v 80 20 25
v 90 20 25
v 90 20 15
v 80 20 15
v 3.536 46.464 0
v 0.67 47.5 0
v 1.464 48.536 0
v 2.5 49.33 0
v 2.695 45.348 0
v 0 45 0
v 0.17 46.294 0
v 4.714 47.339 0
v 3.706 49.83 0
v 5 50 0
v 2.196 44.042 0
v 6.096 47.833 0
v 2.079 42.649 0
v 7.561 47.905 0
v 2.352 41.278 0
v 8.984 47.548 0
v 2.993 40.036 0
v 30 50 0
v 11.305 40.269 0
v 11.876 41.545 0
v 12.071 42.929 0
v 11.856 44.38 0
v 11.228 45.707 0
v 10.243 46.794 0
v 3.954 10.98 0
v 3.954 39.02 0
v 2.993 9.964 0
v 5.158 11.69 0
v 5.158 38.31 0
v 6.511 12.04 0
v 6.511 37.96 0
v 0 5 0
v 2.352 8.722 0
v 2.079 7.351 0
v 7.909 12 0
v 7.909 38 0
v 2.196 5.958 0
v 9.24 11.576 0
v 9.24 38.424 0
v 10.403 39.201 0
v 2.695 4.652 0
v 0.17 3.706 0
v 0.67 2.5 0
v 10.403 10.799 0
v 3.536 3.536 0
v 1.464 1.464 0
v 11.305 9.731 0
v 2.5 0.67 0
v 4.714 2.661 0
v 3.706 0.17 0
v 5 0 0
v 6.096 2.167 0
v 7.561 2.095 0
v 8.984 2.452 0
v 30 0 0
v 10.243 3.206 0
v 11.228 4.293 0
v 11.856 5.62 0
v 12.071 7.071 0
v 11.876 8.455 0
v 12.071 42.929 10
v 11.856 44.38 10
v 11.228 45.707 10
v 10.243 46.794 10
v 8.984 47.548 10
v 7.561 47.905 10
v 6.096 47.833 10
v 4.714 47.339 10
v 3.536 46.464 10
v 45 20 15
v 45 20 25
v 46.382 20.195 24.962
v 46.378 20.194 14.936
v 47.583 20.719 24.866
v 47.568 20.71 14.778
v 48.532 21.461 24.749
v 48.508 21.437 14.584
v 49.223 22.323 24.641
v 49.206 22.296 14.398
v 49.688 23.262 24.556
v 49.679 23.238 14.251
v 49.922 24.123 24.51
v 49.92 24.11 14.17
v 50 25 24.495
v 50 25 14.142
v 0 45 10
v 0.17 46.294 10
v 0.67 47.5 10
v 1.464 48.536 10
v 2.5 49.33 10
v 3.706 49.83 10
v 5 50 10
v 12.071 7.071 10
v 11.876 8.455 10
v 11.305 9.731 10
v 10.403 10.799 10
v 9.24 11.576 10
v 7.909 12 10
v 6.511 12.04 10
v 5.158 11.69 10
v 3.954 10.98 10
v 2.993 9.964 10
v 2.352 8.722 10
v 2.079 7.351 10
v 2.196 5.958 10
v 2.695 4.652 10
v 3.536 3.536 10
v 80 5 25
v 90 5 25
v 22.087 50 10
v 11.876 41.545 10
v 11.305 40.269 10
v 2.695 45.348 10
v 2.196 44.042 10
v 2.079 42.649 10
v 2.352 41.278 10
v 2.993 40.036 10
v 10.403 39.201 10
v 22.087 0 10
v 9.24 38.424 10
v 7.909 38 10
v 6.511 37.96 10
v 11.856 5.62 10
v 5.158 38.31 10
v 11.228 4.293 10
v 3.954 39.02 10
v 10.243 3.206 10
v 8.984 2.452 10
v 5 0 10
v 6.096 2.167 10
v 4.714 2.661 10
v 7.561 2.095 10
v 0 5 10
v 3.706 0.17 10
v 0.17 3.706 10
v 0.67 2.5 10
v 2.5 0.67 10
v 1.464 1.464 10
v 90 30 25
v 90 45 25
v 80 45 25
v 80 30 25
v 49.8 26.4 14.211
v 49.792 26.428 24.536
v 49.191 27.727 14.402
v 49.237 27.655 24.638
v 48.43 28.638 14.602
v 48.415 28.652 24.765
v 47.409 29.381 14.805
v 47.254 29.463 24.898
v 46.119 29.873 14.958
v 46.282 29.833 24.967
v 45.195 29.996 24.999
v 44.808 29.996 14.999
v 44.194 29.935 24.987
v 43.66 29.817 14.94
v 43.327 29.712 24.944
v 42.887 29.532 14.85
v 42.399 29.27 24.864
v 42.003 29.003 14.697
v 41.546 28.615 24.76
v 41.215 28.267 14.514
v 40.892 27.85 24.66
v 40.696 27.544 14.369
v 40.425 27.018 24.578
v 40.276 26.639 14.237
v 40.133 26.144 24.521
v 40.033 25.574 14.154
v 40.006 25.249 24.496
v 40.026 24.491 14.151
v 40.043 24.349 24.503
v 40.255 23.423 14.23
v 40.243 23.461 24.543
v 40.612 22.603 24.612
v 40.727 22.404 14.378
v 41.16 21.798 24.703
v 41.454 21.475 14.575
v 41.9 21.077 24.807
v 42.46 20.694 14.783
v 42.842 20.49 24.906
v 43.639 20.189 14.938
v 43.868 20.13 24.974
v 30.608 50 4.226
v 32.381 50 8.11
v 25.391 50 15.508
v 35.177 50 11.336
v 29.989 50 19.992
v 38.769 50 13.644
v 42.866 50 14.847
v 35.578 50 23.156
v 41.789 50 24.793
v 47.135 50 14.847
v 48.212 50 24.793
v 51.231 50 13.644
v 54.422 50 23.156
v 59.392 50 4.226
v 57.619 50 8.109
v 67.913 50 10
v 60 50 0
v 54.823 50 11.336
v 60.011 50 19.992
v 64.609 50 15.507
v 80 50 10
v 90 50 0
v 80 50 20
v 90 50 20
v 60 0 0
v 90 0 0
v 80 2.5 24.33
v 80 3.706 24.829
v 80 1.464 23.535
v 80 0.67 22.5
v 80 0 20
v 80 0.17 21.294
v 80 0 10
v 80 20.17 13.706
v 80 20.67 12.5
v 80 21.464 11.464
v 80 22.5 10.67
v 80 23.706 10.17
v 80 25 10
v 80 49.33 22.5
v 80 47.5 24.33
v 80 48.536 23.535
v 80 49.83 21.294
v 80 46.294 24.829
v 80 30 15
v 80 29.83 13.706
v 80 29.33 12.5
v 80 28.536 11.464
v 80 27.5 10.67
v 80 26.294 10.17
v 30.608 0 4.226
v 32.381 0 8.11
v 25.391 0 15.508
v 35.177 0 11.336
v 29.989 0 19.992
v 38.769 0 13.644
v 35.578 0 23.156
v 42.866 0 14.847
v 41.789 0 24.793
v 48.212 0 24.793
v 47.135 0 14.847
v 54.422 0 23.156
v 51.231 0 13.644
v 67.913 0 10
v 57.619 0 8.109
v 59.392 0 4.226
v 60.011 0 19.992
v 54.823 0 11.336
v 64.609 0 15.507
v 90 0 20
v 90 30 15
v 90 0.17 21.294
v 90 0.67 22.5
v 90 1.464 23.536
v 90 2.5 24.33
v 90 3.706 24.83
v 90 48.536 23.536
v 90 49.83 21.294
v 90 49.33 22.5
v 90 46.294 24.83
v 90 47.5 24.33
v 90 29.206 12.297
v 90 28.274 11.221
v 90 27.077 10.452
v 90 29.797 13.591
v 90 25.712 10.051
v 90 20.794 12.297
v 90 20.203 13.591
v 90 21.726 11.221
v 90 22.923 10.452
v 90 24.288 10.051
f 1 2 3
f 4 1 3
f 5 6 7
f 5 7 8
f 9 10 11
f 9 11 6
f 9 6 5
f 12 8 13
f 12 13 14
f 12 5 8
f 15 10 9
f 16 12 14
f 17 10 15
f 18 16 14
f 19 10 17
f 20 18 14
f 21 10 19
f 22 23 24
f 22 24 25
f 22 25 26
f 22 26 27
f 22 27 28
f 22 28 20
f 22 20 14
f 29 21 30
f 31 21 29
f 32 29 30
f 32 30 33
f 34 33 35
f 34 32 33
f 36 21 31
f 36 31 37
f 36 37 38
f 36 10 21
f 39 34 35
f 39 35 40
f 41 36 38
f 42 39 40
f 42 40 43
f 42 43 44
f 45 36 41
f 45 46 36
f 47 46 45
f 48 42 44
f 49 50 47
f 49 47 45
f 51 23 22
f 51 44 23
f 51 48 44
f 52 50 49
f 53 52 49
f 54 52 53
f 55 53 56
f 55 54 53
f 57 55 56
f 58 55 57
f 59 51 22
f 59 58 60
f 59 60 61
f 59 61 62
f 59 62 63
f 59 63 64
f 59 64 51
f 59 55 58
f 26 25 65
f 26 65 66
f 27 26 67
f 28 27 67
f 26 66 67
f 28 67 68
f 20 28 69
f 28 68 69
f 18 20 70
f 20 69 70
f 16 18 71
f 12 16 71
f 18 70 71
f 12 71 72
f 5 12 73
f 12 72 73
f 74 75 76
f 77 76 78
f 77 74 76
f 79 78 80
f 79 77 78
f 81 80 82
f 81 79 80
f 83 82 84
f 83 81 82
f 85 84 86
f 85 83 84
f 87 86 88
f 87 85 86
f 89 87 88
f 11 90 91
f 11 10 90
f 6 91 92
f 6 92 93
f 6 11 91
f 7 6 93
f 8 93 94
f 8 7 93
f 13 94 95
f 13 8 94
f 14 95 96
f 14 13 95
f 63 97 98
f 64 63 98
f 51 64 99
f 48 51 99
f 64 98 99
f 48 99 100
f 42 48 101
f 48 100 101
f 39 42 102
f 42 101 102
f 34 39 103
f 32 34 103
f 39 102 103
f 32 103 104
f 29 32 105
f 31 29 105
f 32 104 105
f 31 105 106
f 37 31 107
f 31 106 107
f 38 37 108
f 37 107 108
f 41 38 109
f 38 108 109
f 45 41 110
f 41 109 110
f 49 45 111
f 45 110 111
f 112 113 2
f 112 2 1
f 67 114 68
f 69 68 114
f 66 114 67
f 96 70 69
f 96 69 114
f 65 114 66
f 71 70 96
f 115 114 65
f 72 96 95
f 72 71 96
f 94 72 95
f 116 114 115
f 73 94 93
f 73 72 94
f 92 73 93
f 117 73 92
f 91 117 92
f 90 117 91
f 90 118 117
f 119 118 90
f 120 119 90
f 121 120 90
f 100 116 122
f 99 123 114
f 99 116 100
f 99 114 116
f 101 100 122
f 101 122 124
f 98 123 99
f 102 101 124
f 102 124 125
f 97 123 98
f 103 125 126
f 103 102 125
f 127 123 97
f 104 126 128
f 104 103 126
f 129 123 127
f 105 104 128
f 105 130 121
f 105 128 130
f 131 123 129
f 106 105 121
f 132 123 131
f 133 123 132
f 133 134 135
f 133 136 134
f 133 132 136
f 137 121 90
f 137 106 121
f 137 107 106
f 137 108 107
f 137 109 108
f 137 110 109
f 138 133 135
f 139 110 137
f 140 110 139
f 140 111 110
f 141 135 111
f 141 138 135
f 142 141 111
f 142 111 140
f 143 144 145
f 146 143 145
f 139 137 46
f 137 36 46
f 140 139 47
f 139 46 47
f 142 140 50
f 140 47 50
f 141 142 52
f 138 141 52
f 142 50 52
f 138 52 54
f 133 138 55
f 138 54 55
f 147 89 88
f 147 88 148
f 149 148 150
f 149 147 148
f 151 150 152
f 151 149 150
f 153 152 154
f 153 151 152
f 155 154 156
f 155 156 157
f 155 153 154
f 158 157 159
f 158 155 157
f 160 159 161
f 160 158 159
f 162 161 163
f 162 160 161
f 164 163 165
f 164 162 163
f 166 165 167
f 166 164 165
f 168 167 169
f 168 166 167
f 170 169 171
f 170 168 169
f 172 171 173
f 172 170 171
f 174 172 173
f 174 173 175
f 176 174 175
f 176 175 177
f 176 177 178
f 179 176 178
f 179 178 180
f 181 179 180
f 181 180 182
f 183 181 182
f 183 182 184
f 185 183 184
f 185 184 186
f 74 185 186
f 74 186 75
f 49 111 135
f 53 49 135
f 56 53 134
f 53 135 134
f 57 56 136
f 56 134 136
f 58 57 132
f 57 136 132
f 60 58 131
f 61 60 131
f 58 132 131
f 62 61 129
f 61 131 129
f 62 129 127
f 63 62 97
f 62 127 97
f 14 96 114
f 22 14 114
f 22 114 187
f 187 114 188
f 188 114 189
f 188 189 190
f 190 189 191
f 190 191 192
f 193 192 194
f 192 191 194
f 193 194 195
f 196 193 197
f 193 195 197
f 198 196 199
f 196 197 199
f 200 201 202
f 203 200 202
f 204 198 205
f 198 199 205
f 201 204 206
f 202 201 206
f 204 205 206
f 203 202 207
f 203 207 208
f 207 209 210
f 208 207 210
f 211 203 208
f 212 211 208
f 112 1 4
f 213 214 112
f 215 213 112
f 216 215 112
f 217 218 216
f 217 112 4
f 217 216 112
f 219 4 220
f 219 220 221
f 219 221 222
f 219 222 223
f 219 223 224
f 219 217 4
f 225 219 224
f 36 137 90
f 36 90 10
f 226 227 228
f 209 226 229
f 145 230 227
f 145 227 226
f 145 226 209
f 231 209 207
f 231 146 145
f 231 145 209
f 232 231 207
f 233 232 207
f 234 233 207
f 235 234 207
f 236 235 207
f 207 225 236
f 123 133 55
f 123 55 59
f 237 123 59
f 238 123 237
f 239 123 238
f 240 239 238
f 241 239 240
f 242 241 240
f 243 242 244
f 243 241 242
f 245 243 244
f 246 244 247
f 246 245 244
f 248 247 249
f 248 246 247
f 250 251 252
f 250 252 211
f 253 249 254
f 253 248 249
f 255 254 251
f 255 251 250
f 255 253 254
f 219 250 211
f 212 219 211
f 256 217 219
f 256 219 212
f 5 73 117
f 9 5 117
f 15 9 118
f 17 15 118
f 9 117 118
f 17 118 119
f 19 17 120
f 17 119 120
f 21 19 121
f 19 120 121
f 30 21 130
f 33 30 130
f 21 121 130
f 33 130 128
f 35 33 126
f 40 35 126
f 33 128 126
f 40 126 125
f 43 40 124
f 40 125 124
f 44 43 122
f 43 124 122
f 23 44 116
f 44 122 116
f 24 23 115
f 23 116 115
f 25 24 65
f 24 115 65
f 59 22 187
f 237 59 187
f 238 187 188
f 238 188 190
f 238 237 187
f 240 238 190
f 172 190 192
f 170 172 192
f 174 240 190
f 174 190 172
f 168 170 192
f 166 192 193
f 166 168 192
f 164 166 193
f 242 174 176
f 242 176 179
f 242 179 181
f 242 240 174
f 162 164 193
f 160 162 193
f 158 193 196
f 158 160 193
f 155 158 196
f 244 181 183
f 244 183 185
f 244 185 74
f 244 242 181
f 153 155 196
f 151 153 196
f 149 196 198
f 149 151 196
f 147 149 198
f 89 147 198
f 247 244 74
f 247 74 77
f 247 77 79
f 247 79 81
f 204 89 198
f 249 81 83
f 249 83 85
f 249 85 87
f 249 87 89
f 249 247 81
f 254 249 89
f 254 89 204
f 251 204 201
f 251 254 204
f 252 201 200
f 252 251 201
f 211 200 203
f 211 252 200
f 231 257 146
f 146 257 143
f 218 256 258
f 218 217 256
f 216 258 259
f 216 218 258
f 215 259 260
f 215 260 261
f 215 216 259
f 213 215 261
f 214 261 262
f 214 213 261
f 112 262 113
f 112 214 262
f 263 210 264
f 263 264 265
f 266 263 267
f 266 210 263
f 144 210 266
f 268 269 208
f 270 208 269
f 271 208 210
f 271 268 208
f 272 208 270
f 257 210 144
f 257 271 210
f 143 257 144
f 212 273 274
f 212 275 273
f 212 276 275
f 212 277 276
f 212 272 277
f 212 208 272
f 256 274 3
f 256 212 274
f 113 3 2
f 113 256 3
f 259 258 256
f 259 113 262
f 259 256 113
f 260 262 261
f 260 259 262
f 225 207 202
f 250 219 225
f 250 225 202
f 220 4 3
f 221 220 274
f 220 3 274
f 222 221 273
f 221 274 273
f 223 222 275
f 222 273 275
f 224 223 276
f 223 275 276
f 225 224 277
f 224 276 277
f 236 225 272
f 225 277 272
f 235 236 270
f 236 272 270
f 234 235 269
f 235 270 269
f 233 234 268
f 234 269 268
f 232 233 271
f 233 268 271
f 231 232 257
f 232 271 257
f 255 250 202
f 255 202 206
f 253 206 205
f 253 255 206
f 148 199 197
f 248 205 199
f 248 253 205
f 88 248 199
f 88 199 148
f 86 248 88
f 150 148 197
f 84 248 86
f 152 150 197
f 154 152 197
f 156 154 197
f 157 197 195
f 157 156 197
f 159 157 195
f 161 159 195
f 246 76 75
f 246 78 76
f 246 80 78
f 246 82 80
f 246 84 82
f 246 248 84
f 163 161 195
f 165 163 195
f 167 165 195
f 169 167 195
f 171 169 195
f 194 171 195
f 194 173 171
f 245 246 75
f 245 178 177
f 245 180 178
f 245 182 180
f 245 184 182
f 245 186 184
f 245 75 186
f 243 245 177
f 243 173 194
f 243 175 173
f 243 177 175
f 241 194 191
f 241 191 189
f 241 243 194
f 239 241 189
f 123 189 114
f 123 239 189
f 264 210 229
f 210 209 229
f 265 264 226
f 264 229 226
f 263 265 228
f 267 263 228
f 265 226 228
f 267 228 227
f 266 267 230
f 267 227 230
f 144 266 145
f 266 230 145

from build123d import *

# Parameters (mm, degrees)
F1_DEPTH = 50
F3_DEPTH = 10
F5_DEPTH = 10
F7_DEPTH = 25.9997663884
F8_R     = 5
F9_R     = 5


with BuildPart() as f1:
    # F0 (on Front) → F1 (new body)
    with BuildSketch(Plane.XZ):
        with BuildLine():
            Line((0, 10), (0, 0))
            Line((0, 0), (30, 0))
            ThreePointArc((30.0000000018, 0), (45.0002337116, 14.9997662866), (59.9999999982, -0.0004674232))
            Line((60, -0.0004674232), (89.9999999964, 0))
            Line((89.9999999964, 0), (89.999610477, 24.999999997))
            Line((89.999610477, 24.999999997), (79.9996104782, 24.9998441892))
            Line((79.9996104782, 24.9998441892), (79.9998441898, 9.999844191))
            Line((79.9998441898, 9.999844191), (67.9129266661, 9.9996558675))
            ThreePointArc((67.9129266661, 9.9996558675), (45.0001877399, 24.9997662877), (22.0872235267, 10))
            Line((22.0872235267, 10), (0, 10))
        make_face()
    extrude(amount=-F1_DEPTH)

    # F2 (on face) → F3 (cut, through all)
    with BuildSketch(Plane(origin=(89.9999999745, 0, 0.0014022697), x_dir=(0, 1, 0), z_dir=(0.9999999999, 0, 1.55808e-05))):
        with BuildLine():
            Line((30, 24.9985977303), (20, 24.9985977303))
            Line((20, 24.9985977303), (20, 14.9985977303))
            ThreePointArc((20, 14.9985977303), (25, 9.9985977303), (30, 14.9985977303))
            Line((30, 14.9985977303), (30, 24.9985977303))
        make_face()
    extrude(amount=-F3_DEPTH, mode=Mode.SUBTRACT)

    # F4 (on face) → F5 (cut, through all)
    with BuildSketch(Plane.XY.offset(10)):
        with BuildLine():
            ThreePointArc((12.0710678119, 42.9289321881), (8.9844849737, 47.5483298507), (3.5355339059, 46.4644660941))
            ThreePointArc((3.5355339059, 46.4644660941), (5.15765065, 38.3095345256), (12.0710678119, 42.9289321881))
        make_face()
        with BuildLine():
            ThreePointArc((12.0710678119, 7.0710678119), (5.15765065, 11.6904654744), (3.5355339059, 3.5355339059))
            ThreePointArc((3.5355339059, 3.5355339059), (8.9844849737, 2.4516701493), (12.0710678119, 7.0710678119))
        make_face()
    extrude(amount=-F5_DEPTH, mode=Mode.SUBTRACT)

    # F6 (on Top) → F7 (cut, up to face)
    with BuildSketch(Plane.XY):
        with BuildLine():
            ThreePointArc((45, 20), (48.5355339059, 21.4644660941), (50, 25))
            ThreePointArc((50, 25), (41.4644660941, 28.5355339059), (45, 20))
        make_face()
    extrude(amount=F7_DEPTH, mode=Mode.SUBTRACT)

    # F8
    f8_edges = [f1.edges().sort_by_distance(p)[0] for p in [
        (0, 0, 5),
        (0, 50, 5),
    ]]
    fillet(f8_edges, radius=F8_R)

    # F9
    f9_edges = [f1.edges().sort_by_distance(p)[0] for p in [
        (84.99961, 0, 24.999922),
        (84.99961, 50, 24.999922),
    ]]
    fillet(f9_edges, radius=F9_R)


solid = f1.part
